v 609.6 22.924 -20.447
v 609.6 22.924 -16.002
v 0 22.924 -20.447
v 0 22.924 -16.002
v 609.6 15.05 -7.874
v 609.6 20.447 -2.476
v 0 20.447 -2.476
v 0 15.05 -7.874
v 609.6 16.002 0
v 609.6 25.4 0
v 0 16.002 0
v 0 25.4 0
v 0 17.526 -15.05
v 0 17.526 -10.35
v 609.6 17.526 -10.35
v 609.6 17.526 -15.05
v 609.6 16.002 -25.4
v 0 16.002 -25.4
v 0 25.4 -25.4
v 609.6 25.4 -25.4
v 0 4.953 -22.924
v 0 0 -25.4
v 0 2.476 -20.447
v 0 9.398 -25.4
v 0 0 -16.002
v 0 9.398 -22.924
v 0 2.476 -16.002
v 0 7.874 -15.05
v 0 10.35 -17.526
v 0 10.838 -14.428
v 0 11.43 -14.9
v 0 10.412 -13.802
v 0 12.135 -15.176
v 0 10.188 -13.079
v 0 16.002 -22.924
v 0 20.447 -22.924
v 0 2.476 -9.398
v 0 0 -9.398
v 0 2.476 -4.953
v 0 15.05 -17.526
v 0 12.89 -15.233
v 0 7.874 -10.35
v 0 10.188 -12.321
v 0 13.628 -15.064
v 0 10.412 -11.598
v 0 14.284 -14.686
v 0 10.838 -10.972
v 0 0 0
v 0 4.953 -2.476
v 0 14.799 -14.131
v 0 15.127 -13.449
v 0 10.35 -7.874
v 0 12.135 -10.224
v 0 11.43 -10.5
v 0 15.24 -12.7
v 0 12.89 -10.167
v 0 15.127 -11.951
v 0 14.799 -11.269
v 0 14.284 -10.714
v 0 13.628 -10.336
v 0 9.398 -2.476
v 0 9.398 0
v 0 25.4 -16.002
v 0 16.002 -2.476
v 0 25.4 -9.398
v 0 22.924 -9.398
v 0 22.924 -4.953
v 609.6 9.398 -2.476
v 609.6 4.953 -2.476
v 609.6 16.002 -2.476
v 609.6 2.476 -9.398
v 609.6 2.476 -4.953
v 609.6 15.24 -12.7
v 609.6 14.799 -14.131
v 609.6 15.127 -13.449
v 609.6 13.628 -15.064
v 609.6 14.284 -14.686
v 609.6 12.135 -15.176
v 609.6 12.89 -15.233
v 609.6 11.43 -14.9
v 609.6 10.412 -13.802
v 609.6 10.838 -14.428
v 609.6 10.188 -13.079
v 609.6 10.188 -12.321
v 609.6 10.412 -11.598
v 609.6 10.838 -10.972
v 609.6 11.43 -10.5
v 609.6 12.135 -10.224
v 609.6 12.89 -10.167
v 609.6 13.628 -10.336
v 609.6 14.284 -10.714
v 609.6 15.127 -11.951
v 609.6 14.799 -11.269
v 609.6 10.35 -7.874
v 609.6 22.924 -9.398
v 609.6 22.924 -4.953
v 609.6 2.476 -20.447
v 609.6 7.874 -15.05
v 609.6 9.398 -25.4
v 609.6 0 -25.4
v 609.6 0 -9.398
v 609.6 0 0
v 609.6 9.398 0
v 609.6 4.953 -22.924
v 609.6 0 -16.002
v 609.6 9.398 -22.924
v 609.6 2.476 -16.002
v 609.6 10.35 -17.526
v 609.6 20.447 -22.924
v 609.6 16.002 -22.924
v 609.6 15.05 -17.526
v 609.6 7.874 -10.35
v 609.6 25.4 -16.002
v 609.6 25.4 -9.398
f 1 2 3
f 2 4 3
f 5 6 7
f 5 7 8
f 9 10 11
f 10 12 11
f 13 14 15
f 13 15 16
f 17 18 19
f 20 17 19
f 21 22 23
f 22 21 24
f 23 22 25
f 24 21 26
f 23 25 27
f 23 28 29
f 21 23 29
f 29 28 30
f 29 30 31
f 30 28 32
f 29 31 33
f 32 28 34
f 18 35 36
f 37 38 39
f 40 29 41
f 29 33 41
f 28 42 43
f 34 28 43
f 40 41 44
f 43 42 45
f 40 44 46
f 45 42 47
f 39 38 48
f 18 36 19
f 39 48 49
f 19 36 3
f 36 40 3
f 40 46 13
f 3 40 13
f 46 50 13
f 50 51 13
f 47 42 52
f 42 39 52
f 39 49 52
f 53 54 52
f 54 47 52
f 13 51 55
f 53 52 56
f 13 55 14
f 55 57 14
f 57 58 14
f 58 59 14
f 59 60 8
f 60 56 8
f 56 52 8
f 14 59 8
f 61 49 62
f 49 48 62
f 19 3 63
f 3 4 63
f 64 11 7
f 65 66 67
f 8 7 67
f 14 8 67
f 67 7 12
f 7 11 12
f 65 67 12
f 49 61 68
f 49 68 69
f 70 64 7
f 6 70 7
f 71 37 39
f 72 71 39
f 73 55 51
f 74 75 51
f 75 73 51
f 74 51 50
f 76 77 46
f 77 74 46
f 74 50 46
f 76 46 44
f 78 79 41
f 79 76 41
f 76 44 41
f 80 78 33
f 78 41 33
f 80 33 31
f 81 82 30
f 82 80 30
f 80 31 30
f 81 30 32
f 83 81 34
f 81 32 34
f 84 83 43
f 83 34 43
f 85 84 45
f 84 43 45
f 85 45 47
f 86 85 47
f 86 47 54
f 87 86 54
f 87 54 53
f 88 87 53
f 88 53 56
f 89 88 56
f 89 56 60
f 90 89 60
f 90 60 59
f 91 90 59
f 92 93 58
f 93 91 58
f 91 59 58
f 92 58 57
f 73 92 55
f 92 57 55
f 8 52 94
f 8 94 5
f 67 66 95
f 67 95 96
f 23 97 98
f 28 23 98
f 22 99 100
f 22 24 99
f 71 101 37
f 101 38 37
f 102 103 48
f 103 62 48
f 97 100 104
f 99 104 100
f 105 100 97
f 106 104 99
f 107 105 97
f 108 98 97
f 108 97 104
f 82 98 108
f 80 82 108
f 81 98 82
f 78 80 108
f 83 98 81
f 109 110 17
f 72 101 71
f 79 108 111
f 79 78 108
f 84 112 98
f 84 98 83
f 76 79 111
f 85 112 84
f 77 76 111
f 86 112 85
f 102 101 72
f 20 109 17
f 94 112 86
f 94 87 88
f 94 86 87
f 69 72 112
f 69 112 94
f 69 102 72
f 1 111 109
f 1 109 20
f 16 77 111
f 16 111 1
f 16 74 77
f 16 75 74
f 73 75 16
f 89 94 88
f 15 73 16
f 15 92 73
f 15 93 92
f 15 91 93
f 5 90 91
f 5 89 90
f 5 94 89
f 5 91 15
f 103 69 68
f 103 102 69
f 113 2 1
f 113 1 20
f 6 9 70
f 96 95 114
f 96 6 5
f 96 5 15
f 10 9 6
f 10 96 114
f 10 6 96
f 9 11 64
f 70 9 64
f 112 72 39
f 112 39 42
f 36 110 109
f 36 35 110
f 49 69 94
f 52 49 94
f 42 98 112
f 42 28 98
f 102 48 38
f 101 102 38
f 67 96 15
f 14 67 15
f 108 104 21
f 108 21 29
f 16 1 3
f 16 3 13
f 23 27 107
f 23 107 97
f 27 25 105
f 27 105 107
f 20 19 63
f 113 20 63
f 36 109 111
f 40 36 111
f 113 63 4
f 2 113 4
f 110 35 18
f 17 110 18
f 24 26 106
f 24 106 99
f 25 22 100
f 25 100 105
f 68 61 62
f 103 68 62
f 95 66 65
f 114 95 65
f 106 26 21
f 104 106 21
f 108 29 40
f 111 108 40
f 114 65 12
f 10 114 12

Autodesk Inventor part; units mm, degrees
ref_plane "YZ Plane" through (0, 0, 0) normal (1, 0, 0) x (0, 1, 0)
ref_plane "XZ Plane" through (0, 0, 0) normal (0, 1, 0) x (-1, 0, 0)
ref_plane "XY Plane" through (0, 0, 0) normal (0, 0, 1) x (1, 0, 0)
sketch "Sketch1" plane through (0, 0, 0) normal (1, 0, 0) x (0, 1, 0)
  line L0 (0, 0) -> (0, -9.398)
  line L1 (0, -9.398) -> (2.4765, -9.398)
  line L2 (9.398, -2.4765) -> (9.398, 0)
  line L3 (9.398, 0) -> (0, 0)
  line L4 (16.002, 0) -> (16.002, -2.4765)
  line L5 (22.9235, -9.398) -> (25.4, -9.398)
  line L6 (25.4, -9.398) -> (25.4, 0)
  line L7 (25.4, 0) -> (16.002, 0)
  line L8 (25.4, -16.002) -> (22.9235, -16.002)
  line L9 (16.002, -22.9235) -> (16.002, -25.4)
  line L10 (16.002, -25.4) -> (25.4, -25.4)
  line L11 (25.4, -25.4) -> (25.4, -16.002)
  line L12 (0, -16.002) -> (2.4765, -16.002)
  line L13 (9.398, -22.9235) -> (9.398, -25.4)
  line L14 (9.398, -25.4) -> (0, -25.4)
  line L15 (0, -25.4) -> (0, -16.002)
  line L16 (22.9235, -9.398) -> (22.9235, -4.953)
  line L17 (16.002, -2.4765) -> (20.447, -2.4765)
  line L18 (20.447, -2.4765) -> (15.0495, -7.874)
  line L19 (20.447, -2.4765) -> (28.0802, -2.4765) construction
  line L20 (22.9235, -4.953) -> (17.526, -10.3505)
  line L21 (22.9235, -16.002) -> (22.9235, -20.447)
  line L22 (22.9235, -20.447) -> (17.526, -15.0495)
  line L23 (16.002, -22.9235) -> (20.447, -22.9235)
  line L24 (20.447, -22.9235) -> (15.0495, -17.526)
  line L25 (2.4765, -16.002) -> (2.4765, -20.447)
  line L26 (2.4765, -20.447) -> (7.874, -15.0495)
  line L27 (9.398, -22.9235) -> (4.953, -22.9235)
  line L28 (4.953, -22.9235) -> (10.3505, -17.526)
  line L29 (9.398, -2.4765) -> (4.953, -2.4765)
  line L30 (4.953, -2.4765) -> (10.3505, -7.874)
  line L31 (2.4765, -9.398) -> (2.4765, -4.953)
  line L32 (2.4765, -4.953) -> (7.874, -10.3505)
  line L33 (10.3505, -7.874) -> (15.0495, -7.874)
  line L34 (17.526, -10.3505) -> (17.526, -15.0495)
  line L35 (10.3505, -17.526) -> (15.0495, -17.526)
  line L36 (7.874, -15.0495) -> (7.874, -10.3505)
  circle A0 centre (12.7, -12.7) radius 2.54
  dimension "d2" = 9.398
  dimension "d3" = 2.4765
  dimension "d7" = 2.4765
  dimension "d10" = 2.4765
  dimension "d11" = 25.4
  dimension "d13" = 2.4765
  dimension "d16" = 2.4765
  dimension "d17" = 9.398
  dimension "d18" = 25.4
  dimension "d23" = 2.4765
  dimension "d24" = 25.4
  dimension "d25" = 25.4
  dimension "d32" = 4.445
  dimension "d33" = 4.445
  dimension "d35" = 135
  dimension "d36" = 4.445
  dimension "d37" = 4.445
  dimension "d38" = 2.4765
  dimension "d40" = 4.445
  dimension "d41" = 4.445
  dimension "d42" = 4.445
  dimension "d43" = 4.445
  dimension "d44" = 5.08
extrude "Extrusion1" add sketch "Sketch1" along normal blind 609.6
properties part number "LatX24in1"
